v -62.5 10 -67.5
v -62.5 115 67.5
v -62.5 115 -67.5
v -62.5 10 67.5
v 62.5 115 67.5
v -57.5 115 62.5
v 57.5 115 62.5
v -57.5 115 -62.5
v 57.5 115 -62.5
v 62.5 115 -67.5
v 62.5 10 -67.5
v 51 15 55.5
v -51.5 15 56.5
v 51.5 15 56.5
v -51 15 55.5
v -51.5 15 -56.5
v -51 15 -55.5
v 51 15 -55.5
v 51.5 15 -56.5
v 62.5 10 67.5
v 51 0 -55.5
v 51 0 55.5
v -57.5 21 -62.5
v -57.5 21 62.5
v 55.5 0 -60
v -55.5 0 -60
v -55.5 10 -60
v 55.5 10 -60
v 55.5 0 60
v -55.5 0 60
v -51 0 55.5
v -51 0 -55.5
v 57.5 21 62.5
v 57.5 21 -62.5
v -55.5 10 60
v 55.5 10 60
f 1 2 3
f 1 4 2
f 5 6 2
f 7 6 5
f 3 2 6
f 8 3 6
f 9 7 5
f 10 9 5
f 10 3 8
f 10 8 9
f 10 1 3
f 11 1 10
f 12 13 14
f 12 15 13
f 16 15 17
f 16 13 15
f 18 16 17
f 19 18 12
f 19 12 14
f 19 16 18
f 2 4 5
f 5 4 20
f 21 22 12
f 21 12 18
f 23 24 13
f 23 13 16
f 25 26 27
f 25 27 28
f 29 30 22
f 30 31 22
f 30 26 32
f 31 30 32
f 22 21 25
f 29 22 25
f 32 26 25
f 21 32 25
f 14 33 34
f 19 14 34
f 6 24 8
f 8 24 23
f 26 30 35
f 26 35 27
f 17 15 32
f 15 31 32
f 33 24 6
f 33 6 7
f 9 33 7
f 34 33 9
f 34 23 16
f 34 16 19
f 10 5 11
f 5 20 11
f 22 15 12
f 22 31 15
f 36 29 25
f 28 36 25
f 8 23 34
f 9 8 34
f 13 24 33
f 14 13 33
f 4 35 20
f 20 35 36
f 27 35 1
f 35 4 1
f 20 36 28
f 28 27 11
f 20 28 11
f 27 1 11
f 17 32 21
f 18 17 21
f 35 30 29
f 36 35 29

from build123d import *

# Parameters (mm, degrees)
SKETCH1_W           = 111
SKETCH1_H           = 120
SKETCH1_W_2         = 102
SKETCH1_H_2         = 111
BOSS_EXTRUDE1_DEPTH = 10
SKETCH2_W           = 125
SKETCH2_H           = 135
SKETCH2_W_2         = 102
SKETCH2_H_2         = 111
BOSS_EXTRUDE2_DEPTH = 5
SKETCH4_W           = 125
SKETCH4_H           = 135
SKETCH4_W_2         = 115
SKETCH4_H_2         = 125
BOSS_EXTRUDE4_DEPTH = 100
CHAMFER1_SIZE       = 6


with BuildPart() as part:
    # Sketch1 → Boss-Extrude1 (new body)
    with BuildSketch(Plane(origin=(0, 0, 0), x_dir=(1, 0, 0), z_dir=(0, 1, 0))):
        Rectangle(SKETCH1_W, SKETCH1_H)
        Rectangle(SKETCH1_W_2, SKETCH1_H_2, mode=Mode.SUBTRACT)
    extrude(amount=BOSS_EXTRUDE1_DEPTH)

    # Sketch2 → Boss-Extrude2 (add)
    with BuildSketch(Plane(origin=(0, 10, 0), x_dir=(1, 0, 0), z_dir=(0, 1, 0))):
        Rectangle(SKETCH2_W, SKETCH2_H)
        Rectangle(SKETCH2_W_2, SKETCH2_H_2, mode=Mode.SUBTRACT)
    extrude(amount=BOSS_EXTRUDE2_DEPTH)

    # Sketch4 → Boss-Extrude4 (add)
    with BuildSketch(Plane(origin=(0, 15, 0), x_dir=(1, 0, 0), z_dir=(0, 1, 0))):
        Rectangle(SKETCH4_W, SKETCH4_H)
        Rectangle(SKETCH4_W_2, SKETCH4_H_2, mode=Mode.SUBTRACT)
    extrude(amount=BOSS_EXTRUDE4_DEPTH)

    # Chamfer1
    chamfer1_edges = [part.edges().sort_by_distance(p)[0] for p in [
        (0, 15, -62.5),
        (-57.5, 15, 0),
        (0, 15, 62.5),
        (57.5, 15, 0),
    ]]
    chamfer(chamfer1_edges, length=CHAMFER1_SIZE)


solid = part.part
